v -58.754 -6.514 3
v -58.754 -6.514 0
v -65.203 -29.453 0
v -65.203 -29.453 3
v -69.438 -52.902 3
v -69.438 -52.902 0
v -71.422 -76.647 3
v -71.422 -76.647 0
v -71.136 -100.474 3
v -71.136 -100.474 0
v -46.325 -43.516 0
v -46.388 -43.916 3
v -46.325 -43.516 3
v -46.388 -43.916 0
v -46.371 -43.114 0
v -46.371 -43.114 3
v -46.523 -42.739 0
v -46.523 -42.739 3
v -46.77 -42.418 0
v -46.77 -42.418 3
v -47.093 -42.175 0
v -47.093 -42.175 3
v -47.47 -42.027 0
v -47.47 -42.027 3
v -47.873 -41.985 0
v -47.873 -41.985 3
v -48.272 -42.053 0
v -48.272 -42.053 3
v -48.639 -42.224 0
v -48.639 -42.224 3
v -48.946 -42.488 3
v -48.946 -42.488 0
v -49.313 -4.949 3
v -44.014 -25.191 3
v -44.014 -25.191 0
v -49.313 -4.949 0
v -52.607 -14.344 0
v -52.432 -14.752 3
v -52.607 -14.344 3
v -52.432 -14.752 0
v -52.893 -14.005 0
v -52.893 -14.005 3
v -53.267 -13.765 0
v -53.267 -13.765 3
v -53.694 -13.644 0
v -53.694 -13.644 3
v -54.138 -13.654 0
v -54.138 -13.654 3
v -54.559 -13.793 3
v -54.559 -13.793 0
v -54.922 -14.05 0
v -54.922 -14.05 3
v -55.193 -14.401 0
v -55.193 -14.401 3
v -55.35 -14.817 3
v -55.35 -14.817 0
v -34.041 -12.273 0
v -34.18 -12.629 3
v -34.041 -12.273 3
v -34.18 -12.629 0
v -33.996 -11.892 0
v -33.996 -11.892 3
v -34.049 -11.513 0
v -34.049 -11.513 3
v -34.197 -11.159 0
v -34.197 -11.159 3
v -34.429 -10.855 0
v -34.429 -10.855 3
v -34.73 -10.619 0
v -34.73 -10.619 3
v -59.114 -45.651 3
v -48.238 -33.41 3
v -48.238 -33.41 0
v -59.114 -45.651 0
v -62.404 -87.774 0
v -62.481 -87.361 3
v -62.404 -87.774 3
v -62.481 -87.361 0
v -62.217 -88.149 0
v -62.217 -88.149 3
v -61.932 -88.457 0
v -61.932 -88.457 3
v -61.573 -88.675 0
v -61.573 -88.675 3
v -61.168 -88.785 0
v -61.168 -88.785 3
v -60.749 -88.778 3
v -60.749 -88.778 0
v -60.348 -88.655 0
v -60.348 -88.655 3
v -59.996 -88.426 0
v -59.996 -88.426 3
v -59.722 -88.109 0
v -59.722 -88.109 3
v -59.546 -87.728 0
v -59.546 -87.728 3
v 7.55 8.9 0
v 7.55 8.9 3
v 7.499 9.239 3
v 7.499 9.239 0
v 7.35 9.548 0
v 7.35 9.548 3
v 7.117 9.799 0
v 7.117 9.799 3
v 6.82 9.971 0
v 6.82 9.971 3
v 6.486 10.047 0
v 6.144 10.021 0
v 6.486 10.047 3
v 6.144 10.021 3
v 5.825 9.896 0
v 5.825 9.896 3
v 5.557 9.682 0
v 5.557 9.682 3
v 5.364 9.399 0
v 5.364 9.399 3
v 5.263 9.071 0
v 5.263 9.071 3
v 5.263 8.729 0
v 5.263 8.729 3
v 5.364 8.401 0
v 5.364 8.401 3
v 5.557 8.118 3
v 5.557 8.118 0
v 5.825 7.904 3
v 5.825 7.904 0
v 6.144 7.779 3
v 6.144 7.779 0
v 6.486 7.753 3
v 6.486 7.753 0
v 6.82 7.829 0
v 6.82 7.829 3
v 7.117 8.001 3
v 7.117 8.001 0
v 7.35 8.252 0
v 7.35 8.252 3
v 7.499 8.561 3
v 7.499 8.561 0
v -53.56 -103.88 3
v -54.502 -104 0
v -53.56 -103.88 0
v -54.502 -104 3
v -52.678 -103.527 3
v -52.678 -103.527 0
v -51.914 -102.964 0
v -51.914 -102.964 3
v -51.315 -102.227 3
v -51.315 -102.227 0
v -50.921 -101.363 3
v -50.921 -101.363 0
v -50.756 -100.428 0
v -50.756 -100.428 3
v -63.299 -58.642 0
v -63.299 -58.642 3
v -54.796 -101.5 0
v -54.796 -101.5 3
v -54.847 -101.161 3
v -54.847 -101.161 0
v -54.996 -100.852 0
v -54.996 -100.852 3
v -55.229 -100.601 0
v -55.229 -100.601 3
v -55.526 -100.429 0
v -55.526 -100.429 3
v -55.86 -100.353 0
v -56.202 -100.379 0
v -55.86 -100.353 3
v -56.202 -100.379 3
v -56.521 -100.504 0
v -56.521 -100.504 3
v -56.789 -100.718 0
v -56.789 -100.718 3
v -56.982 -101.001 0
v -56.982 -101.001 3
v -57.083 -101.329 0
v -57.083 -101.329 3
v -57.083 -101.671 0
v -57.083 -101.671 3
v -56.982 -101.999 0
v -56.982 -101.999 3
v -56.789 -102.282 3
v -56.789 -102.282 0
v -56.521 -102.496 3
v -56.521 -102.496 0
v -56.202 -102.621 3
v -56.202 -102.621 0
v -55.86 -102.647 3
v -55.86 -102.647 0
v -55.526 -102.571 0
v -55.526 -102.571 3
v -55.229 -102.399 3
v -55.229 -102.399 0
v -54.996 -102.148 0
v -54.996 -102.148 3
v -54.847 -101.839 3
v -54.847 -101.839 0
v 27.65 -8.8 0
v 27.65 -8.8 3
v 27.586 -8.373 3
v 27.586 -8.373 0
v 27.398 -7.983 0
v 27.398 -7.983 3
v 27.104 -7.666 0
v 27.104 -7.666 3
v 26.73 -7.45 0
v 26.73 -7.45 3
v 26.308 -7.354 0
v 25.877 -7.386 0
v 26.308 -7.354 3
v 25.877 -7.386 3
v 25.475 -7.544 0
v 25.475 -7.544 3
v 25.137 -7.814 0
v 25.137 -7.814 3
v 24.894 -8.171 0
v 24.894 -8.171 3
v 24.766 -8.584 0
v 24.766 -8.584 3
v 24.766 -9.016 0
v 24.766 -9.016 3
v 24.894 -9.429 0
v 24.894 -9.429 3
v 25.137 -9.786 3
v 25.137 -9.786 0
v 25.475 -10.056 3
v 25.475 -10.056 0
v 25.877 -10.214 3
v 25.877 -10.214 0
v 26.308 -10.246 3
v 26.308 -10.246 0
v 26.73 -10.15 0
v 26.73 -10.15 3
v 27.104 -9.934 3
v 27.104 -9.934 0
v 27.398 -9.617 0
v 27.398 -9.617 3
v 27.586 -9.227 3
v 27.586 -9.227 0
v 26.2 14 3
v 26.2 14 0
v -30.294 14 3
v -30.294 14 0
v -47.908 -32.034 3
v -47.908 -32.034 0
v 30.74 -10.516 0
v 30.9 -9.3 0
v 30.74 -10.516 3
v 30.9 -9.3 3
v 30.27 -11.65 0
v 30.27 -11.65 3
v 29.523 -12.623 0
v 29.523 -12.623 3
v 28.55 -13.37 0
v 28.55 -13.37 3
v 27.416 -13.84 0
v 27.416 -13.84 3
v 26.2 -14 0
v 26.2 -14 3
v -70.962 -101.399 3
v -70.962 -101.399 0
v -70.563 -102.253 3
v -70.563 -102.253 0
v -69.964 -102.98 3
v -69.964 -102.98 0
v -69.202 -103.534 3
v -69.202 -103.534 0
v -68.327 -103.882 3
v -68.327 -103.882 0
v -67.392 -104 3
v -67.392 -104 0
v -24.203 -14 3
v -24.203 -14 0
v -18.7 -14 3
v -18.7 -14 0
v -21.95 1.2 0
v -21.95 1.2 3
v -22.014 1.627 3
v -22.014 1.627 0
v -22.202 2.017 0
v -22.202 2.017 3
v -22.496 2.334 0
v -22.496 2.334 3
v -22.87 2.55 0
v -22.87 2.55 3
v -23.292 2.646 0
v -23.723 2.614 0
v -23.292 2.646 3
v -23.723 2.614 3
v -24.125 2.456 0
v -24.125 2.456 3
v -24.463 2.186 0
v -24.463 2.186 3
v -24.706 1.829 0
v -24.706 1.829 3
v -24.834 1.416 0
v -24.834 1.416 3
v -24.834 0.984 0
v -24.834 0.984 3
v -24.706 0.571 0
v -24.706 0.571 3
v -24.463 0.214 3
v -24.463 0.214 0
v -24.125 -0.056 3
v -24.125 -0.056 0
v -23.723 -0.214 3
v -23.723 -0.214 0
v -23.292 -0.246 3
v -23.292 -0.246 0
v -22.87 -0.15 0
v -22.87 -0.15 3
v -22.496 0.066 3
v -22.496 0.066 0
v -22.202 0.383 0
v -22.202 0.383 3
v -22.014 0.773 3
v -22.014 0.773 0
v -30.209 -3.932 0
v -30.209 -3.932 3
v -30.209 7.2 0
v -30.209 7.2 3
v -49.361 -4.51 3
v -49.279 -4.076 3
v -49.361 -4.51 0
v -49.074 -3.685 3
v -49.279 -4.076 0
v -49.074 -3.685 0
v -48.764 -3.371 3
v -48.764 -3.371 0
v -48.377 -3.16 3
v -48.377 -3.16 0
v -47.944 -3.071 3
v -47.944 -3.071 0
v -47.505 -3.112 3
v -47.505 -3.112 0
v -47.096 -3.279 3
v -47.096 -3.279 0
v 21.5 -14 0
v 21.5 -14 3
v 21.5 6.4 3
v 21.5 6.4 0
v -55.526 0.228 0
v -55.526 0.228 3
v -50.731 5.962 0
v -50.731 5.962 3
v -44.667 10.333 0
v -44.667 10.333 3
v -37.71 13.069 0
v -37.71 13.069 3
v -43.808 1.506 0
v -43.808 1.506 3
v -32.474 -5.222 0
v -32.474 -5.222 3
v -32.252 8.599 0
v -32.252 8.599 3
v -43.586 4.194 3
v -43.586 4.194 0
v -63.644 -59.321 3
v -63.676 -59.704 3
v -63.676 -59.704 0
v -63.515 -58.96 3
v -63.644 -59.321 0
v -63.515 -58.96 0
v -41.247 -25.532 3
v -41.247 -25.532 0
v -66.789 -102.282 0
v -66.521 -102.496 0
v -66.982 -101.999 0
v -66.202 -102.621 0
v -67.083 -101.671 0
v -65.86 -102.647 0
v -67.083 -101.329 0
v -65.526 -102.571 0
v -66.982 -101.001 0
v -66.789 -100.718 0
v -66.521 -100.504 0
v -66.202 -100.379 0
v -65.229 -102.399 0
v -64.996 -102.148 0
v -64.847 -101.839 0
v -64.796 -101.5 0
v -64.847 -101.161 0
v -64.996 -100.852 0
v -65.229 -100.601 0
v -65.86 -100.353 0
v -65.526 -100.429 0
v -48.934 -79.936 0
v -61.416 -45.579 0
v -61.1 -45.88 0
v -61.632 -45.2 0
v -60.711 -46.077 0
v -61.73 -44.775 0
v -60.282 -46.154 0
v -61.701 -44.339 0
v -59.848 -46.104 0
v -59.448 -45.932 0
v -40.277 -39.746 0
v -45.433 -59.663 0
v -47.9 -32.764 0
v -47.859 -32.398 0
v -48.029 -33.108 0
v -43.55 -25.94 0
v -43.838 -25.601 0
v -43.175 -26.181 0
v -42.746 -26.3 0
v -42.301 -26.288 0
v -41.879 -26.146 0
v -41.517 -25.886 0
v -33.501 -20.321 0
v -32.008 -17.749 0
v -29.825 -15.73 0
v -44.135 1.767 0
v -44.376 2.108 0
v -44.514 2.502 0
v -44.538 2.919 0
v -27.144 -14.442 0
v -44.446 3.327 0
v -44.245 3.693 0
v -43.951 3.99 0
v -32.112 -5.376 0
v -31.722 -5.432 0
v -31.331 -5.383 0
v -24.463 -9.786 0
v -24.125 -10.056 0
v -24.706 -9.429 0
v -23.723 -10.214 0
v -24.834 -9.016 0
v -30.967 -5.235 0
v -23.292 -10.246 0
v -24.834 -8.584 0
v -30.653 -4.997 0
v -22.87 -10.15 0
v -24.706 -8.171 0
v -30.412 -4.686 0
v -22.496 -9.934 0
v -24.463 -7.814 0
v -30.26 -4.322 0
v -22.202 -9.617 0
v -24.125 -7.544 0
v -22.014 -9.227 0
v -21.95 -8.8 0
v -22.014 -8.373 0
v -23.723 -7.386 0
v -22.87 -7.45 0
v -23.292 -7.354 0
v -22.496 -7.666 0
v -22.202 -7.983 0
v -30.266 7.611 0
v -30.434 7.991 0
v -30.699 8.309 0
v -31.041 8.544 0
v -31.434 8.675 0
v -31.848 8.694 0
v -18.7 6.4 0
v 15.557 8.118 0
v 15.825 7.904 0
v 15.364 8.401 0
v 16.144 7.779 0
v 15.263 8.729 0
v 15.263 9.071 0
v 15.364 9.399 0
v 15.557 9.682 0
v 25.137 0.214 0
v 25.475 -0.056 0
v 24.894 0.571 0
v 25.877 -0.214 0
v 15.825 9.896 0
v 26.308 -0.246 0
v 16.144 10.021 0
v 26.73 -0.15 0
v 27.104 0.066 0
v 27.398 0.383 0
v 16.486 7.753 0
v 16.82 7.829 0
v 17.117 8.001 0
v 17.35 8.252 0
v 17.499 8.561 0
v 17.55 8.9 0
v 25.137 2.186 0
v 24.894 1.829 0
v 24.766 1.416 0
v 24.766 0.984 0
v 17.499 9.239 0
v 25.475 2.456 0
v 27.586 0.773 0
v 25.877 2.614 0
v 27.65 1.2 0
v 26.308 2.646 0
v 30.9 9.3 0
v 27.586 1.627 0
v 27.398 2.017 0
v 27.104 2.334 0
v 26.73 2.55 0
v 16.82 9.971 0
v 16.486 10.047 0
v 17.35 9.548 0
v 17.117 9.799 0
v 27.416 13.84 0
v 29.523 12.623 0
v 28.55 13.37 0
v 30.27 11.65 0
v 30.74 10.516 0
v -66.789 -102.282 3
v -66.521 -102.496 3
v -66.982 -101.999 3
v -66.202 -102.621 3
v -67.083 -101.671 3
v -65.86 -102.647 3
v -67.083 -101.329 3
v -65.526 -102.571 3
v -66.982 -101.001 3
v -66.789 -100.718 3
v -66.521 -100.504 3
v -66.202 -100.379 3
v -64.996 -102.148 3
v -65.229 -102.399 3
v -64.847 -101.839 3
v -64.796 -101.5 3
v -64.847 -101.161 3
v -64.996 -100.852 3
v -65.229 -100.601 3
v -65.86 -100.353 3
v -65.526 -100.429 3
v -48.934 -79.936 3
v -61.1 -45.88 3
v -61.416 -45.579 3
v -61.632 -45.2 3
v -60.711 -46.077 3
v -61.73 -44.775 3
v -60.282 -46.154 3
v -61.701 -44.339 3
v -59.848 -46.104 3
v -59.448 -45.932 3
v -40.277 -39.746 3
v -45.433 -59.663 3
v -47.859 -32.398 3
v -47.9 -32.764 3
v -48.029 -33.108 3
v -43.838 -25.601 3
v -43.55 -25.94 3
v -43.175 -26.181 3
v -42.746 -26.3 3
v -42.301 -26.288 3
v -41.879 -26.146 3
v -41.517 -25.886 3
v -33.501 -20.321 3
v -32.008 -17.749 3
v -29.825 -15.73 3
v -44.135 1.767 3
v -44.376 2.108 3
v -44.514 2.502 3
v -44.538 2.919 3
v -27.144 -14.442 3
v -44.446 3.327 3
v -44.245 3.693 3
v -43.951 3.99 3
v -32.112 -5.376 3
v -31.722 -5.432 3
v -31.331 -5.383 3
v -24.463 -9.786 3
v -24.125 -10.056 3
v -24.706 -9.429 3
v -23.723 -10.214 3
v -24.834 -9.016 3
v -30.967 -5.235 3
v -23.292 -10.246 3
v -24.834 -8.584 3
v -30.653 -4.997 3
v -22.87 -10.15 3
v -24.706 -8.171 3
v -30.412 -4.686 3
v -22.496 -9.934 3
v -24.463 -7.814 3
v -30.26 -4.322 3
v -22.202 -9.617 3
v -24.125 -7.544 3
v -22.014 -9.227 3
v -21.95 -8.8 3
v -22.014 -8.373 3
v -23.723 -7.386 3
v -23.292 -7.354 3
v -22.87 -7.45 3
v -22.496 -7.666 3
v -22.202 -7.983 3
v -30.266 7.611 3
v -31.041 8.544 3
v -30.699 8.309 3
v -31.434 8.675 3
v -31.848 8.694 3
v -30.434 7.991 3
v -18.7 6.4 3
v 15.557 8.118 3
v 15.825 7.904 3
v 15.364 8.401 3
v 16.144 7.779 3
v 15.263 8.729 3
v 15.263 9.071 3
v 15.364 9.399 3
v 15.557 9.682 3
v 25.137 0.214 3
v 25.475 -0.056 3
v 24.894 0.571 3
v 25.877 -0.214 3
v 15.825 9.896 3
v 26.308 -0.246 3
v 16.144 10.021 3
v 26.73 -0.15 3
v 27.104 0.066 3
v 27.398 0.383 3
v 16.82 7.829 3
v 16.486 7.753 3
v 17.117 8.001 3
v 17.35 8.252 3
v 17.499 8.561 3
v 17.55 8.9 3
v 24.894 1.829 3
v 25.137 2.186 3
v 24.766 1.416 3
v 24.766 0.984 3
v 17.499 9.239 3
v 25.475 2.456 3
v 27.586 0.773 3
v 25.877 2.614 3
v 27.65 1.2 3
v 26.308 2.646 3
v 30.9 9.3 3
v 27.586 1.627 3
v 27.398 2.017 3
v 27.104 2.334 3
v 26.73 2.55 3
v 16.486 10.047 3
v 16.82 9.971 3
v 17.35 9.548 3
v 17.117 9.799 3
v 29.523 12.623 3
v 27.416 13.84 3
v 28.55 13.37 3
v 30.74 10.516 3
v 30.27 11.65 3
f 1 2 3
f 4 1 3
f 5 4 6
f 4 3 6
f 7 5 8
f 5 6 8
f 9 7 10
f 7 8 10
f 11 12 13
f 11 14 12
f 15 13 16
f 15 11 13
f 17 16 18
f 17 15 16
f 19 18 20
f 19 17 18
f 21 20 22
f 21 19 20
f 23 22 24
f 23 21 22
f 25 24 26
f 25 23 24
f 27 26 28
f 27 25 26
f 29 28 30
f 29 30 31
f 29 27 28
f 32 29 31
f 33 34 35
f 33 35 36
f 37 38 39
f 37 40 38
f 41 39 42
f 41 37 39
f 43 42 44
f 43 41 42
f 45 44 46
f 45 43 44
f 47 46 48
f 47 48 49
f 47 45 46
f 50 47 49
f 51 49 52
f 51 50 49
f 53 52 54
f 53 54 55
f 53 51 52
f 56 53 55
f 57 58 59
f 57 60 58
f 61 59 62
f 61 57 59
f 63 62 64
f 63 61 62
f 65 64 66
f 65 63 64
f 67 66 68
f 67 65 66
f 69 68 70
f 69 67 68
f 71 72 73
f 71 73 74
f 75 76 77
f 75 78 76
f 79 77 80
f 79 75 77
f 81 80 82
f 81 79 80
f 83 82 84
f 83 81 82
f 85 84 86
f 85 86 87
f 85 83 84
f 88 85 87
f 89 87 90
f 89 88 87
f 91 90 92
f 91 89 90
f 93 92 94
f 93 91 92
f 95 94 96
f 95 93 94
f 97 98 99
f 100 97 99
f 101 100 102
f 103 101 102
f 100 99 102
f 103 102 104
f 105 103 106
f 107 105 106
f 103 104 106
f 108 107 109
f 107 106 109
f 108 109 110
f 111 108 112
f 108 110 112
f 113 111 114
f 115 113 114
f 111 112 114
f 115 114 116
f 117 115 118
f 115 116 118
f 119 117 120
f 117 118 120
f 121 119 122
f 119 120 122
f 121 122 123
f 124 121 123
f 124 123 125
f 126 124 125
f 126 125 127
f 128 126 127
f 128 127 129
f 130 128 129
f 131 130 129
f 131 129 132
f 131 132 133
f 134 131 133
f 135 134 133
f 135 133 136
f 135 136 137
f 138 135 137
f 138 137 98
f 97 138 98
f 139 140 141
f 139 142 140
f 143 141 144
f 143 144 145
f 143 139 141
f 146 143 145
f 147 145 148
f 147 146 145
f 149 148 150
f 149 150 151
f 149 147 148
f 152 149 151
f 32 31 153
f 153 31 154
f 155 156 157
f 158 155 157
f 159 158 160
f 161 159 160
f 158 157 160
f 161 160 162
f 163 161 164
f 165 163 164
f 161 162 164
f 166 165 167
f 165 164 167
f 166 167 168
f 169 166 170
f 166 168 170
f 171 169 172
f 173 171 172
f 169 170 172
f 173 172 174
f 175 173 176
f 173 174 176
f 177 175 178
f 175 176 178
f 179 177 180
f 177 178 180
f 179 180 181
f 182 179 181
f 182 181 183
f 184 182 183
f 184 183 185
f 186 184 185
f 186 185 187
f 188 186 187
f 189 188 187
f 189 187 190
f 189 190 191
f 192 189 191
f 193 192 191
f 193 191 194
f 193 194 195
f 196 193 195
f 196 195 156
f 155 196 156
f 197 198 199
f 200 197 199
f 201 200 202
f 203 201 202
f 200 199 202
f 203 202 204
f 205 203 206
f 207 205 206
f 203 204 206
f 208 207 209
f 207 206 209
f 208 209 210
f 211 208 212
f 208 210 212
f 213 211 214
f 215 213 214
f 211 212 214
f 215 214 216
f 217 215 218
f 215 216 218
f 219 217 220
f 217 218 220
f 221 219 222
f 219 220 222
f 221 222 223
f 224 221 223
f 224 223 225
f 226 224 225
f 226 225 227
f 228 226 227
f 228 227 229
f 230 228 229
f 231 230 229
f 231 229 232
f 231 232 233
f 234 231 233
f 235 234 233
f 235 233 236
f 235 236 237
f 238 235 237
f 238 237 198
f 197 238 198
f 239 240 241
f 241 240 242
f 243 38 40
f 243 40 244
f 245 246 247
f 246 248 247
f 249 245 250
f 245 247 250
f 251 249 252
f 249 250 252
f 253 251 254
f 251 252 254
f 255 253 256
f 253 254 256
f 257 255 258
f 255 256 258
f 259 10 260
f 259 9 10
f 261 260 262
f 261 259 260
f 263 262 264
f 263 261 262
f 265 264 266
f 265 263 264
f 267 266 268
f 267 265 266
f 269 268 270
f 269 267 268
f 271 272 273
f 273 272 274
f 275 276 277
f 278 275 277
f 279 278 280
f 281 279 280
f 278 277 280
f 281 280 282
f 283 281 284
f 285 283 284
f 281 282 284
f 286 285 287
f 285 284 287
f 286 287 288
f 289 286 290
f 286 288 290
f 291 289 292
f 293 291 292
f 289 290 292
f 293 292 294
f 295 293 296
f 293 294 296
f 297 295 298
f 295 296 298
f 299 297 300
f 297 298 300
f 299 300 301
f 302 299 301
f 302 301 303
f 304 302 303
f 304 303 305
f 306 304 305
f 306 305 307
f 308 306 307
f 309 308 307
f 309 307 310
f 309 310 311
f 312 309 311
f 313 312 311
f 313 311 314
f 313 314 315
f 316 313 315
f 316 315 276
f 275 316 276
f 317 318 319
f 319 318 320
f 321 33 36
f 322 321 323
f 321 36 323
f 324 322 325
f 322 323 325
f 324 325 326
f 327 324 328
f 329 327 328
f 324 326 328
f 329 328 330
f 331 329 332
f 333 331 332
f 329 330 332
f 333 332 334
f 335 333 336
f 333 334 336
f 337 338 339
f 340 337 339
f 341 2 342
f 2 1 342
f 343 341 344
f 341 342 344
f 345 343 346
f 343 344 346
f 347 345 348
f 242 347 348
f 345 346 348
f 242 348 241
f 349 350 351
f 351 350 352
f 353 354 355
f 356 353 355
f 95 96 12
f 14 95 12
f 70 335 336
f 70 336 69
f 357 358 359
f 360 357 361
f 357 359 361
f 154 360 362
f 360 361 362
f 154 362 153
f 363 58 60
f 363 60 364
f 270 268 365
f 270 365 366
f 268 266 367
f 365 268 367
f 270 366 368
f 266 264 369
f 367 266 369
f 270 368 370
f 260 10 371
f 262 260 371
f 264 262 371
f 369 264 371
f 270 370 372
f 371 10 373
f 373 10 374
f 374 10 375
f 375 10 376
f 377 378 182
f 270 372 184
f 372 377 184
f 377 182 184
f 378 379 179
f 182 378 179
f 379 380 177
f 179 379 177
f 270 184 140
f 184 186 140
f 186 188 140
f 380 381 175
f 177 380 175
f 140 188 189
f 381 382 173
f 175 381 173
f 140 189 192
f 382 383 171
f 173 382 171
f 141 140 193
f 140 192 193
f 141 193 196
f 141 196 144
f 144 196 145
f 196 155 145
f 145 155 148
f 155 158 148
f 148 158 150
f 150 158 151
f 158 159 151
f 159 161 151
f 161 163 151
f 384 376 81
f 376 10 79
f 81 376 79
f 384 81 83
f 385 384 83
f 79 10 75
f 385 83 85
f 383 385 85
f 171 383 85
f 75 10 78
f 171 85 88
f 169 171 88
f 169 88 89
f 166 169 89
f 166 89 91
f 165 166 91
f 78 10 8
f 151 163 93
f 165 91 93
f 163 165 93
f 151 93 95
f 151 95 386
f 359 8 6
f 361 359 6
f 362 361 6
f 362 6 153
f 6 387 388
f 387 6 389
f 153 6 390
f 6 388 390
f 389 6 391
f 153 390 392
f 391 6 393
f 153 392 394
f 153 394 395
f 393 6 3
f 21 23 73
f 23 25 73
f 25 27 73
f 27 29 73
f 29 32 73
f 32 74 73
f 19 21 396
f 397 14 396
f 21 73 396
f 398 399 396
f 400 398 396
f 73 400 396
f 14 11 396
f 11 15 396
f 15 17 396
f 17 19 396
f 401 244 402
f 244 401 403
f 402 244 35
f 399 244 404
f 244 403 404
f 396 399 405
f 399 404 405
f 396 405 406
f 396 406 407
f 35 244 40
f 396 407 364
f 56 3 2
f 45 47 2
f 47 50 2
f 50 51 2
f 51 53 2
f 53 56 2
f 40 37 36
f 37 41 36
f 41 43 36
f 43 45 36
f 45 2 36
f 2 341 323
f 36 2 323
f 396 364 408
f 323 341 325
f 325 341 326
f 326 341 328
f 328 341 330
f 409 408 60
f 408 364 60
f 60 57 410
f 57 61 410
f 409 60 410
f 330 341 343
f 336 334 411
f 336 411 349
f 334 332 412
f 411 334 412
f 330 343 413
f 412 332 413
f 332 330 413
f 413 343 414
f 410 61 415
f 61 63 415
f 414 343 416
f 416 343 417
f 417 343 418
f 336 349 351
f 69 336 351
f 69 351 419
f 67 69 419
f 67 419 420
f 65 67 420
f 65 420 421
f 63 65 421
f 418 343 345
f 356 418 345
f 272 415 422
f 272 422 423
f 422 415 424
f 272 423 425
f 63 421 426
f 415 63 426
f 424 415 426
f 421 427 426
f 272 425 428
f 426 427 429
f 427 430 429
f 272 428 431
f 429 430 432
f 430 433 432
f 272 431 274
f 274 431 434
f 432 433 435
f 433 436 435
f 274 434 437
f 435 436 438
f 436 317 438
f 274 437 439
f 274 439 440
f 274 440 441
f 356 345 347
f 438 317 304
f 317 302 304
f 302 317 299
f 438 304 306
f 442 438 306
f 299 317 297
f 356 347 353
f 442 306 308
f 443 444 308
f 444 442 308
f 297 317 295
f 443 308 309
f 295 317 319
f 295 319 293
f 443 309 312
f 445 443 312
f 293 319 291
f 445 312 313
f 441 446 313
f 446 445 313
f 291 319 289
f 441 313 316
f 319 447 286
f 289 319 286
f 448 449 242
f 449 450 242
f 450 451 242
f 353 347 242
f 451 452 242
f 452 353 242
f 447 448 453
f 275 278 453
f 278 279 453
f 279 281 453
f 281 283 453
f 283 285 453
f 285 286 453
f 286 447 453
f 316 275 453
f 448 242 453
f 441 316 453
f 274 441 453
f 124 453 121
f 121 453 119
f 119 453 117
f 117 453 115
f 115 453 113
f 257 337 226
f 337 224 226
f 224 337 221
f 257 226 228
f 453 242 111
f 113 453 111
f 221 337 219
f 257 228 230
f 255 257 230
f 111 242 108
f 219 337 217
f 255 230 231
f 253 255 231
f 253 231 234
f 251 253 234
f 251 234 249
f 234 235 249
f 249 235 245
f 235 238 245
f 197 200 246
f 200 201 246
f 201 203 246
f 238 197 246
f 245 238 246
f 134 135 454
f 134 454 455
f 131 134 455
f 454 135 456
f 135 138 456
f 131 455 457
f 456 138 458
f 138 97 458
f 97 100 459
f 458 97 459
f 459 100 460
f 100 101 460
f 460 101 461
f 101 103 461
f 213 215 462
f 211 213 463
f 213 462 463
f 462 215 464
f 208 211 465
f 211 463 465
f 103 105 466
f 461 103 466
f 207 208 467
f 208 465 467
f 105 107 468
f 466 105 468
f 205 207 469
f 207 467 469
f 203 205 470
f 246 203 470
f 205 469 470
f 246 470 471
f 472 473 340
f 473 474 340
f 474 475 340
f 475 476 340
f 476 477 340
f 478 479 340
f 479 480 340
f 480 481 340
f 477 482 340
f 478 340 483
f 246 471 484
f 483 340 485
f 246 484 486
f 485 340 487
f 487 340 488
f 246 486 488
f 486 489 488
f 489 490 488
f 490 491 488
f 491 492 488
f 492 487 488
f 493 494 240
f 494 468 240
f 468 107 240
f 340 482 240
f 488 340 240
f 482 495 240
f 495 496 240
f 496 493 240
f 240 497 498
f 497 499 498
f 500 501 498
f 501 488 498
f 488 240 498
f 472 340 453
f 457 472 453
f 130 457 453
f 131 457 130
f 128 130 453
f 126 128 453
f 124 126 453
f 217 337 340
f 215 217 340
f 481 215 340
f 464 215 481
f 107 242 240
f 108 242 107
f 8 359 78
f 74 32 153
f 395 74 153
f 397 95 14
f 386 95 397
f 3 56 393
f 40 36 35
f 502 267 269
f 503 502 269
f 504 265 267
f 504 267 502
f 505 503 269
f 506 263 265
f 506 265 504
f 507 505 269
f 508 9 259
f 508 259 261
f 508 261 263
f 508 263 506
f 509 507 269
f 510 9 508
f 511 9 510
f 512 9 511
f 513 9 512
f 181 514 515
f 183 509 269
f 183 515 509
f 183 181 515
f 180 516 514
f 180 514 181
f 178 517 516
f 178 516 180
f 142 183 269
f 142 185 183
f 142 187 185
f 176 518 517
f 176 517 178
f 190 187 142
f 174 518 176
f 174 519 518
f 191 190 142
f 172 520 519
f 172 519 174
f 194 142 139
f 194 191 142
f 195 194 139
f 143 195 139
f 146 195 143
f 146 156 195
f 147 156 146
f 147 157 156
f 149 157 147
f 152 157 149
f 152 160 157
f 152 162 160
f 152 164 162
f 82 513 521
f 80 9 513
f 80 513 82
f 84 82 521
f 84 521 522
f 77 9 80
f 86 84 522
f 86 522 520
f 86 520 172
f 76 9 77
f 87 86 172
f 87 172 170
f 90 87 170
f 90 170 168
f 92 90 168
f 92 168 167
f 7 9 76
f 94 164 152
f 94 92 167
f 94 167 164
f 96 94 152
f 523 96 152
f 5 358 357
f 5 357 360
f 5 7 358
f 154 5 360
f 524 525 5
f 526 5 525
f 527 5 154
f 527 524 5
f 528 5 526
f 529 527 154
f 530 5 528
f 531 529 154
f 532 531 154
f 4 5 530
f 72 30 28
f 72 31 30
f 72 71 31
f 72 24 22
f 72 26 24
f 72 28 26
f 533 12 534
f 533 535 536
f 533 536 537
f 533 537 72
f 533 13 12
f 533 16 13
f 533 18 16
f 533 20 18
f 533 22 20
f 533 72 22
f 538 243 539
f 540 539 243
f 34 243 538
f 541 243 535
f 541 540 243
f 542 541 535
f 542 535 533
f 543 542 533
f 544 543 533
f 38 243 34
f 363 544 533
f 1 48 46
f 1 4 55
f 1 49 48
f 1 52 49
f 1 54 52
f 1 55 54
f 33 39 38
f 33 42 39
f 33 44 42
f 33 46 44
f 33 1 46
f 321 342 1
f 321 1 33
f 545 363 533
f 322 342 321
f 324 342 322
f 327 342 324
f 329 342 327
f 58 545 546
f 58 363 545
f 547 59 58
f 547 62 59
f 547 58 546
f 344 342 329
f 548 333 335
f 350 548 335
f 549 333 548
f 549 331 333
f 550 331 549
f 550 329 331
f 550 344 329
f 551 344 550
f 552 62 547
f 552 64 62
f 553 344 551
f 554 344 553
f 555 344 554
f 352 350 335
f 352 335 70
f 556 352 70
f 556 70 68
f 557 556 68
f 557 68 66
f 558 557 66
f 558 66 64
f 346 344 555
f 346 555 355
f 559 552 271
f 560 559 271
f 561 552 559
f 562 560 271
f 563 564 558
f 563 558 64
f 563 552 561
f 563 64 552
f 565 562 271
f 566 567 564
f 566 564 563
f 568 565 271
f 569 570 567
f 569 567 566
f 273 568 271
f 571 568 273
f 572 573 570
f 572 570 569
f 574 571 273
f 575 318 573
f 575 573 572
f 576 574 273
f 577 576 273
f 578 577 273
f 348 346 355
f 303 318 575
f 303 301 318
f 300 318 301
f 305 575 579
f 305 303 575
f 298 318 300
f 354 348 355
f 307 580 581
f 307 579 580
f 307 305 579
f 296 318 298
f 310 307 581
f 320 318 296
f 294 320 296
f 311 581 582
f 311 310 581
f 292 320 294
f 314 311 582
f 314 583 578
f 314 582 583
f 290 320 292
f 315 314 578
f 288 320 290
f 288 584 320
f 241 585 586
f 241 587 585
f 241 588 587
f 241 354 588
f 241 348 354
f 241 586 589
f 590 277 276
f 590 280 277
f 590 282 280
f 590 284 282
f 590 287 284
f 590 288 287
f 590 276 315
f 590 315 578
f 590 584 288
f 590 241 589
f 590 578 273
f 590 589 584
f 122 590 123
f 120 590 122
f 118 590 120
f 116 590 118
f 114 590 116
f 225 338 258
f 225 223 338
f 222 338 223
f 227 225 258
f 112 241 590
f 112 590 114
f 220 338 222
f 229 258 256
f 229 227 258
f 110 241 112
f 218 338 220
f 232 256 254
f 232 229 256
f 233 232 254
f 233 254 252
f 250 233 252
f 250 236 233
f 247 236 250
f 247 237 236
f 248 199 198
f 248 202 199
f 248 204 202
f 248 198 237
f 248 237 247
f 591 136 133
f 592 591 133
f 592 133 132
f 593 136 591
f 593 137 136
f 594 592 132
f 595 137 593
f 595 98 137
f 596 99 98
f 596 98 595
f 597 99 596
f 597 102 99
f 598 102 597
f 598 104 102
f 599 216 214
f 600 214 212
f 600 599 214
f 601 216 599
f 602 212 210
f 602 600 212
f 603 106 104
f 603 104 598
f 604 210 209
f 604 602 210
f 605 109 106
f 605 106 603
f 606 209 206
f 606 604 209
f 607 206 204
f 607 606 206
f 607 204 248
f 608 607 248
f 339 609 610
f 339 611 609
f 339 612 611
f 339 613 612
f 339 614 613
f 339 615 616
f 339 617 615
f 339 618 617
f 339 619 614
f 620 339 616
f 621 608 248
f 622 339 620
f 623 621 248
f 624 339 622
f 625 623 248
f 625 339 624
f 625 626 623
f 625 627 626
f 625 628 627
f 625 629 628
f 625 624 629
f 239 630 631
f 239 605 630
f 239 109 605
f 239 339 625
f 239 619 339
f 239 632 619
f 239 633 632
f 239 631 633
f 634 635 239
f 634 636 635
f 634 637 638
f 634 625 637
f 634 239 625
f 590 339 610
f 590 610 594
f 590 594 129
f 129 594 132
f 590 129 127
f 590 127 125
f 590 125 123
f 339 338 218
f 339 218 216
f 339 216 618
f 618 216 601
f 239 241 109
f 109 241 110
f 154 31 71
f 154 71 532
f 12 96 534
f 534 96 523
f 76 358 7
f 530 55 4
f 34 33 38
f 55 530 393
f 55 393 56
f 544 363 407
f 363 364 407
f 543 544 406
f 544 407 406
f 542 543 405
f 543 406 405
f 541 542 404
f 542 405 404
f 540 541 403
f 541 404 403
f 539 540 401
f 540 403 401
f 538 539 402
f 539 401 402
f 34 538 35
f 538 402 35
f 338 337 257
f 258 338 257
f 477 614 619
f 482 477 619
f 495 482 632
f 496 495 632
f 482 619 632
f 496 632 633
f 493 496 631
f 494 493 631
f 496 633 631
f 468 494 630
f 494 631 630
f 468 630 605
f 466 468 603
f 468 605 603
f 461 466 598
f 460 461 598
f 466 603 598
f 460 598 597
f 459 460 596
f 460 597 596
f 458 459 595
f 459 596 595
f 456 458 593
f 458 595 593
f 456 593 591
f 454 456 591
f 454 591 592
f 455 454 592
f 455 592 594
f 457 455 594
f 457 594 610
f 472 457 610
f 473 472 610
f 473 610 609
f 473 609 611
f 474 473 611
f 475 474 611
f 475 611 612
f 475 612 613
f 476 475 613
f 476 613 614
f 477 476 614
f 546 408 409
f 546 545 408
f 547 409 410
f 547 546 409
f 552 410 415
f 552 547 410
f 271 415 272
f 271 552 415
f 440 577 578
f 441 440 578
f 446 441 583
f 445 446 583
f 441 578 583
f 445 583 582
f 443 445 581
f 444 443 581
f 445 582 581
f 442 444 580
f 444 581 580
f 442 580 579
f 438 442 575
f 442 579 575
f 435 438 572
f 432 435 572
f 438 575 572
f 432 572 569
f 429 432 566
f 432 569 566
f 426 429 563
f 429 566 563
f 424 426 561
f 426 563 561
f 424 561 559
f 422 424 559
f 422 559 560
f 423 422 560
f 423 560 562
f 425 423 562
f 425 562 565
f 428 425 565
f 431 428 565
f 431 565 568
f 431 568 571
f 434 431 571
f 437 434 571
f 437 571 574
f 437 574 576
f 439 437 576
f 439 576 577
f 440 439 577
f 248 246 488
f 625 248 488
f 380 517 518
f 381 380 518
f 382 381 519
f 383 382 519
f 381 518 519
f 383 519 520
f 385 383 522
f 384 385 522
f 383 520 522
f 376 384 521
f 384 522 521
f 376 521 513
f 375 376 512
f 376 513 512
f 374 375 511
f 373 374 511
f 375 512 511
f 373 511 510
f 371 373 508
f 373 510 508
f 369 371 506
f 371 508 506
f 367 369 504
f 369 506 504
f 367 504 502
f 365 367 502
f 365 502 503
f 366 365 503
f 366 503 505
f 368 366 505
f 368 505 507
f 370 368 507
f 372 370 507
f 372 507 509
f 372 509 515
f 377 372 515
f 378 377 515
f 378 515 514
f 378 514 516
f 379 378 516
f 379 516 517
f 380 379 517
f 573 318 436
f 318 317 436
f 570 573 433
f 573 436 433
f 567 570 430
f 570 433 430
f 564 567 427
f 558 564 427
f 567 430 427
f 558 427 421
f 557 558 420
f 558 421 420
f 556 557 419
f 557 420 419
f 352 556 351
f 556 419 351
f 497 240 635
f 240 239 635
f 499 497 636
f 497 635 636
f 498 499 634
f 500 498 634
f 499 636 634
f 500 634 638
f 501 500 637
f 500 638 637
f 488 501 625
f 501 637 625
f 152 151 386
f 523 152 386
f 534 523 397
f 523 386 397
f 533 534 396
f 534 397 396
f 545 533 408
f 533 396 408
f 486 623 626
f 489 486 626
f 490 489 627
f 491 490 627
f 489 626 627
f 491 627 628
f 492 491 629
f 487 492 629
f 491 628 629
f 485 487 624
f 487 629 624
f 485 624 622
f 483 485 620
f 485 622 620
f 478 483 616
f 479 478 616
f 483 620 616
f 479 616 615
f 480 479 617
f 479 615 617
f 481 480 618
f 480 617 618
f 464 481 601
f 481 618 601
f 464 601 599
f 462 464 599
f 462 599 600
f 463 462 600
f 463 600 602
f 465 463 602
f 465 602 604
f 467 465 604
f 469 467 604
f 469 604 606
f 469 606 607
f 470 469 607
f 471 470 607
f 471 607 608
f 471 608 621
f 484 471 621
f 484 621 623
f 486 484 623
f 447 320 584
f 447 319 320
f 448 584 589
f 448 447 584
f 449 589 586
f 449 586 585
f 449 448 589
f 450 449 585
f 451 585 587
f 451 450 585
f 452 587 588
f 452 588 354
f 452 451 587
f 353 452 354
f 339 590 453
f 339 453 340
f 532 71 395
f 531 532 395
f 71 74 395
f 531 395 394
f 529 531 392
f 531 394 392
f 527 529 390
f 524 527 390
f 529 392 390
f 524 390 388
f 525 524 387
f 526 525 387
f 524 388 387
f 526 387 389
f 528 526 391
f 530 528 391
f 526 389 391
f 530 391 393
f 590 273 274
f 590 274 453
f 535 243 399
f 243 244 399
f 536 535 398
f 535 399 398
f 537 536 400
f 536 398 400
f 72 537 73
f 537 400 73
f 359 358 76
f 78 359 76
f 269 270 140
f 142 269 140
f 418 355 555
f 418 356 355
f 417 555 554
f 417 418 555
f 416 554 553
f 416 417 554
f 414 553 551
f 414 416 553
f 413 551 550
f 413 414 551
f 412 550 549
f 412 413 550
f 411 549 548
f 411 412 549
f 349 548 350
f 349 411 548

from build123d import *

# Parameters (mm, degrees)
BOSS_EXTRU_1_DEPTH      = 3
ENL_V_MAT_EXTRU_1_REACH = 128.289
ESQUISSE2_W             = 40.2
ESQUISSE2_H             = 20.4
ENL_V_MAT_EXTRU_2_REACH = 128.289
ESQUISSE3_R             = 1.45
CONG_2_R                = 4.7
CONG_3_R                = 10
CONG_4_R                = 30
CONG_5_R                = 3.75
ENL_V_MAT_EXTRU_3_REACH = 128.289
CONG_6_R                = 1.5
ENL_V_MAT_EXTRU_4_REACH = 128.289
ESQUISSE5_R             = 1.15
ESQUISSE6_R             = 1.15
ENL_V_MAT_EXTRU_5_DEPTH = 10


with BuildPart() as part:
    # Esquisse1 → Boss.-Extru.1 (new body)
    with BuildSketch(Plane.XY):
        with BuildLine():
            Line((-30.9, 14), (-50.9, 14))
            ThreePointArc((-50.9, 14), (-68.065443638, -43.785518027), (-70.9, -104))
            Line((-70.9, -104), (-50.9, -104))
            ThreePointArc((-50.9, -104), (-45.084672315, -58.070072819), (-30.9, -14))
            Line((-30.9, -14), (30.9, -14))
            Line((30.9, -14), (30.9, 14))
            Line((30.9, 14), (-30.9, 14))
        make_face()
    extrude(amount=BOSS_EXTRU_1_DEPTH)

    # Esquisse2 → Enlèv. mat.-Extru.1 (cut, up to next)
    with BuildSketch(Plane.XY.offset(3), mode=Mode.PRIVATE) as enl_v_mat_extru_1_sk1:
        with Locations((1.4, -3.8)):
            Rectangle(ESQUISSE2_W, ESQUISSE2_H)
    enl_v_mat_extru_1_tool1 = extrude(enl_v_mat_extru_1_sk1.sketch, amount=-ENL_V_MAT_EXTRU_1_REACH, mode=Mode.PRIVATE) & part.part
    add(enl_v_mat_extru_1_tool1.solids().sort_by_distance((1.4, -3.8, 3))[0], mode=Mode.SUBTRACT)

    # Esquisse3 → Enlèv. mat.-Extru.2 (cut, up to next)
    with BuildSketch(Plane.XY.offset(3), mode=Mode.PRIVATE) as enl_v_mat_extru_2_sk1:
        with Locations((26.2, -8.8)):
            Circle(ESQUISSE3_R)
    enl_v_mat_extru_2_tool1 = extrude(enl_v_mat_extru_2_sk1.sketch, amount=-ENL_V_MAT_EXTRU_2_REACH, mode=Mode.PRIVATE) & part.part
    # Esquisse3 → Enlèv. mat.-Extru.2 (cut, up to next)
    with BuildSketch(Plane.XY.offset(3), mode=Mode.PRIVATE) as enl_v_mat_extru_2_sk2:
        with Locations((-23.4, -8.8)):
            Circle(ESQUISSE3_R)
    enl_v_mat_extru_2_tool2 = extrude(enl_v_mat_extru_2_sk2.sketch, amount=-ENL_V_MAT_EXTRU_2_REACH, mode=Mode.PRIVATE) & part.part
    # Esquisse3 → Enlèv. mat.-Extru.2 (cut, up to next)
    with BuildSketch(Plane.XY.offset(3), mode=Mode.PRIVATE) as enl_v_mat_extru_2_sk3:
        with Locations((-23.4, 1.2)):
            Circle(ESQUISSE3_R)
    enl_v_mat_extru_2_tool3 = extrude(enl_v_mat_extru_2_sk3.sketch, amount=-ENL_V_MAT_EXTRU_2_REACH, mode=Mode.PRIVATE) & part.part
    # Esquisse3 → Enlèv. mat.-Extru.2 (cut, up to next)
    with BuildSketch(Plane.XY.offset(3), mode=Mode.PRIVATE) as enl_v_mat_extru_2_sk4:
        with Locations((26.2, 1.2)):
            Circle(ESQUISSE3_R)
    enl_v_mat_extru_2_tool4 = extrude(enl_v_mat_extru_2_sk4.sketch, amount=-ENL_V_MAT_EXTRU_2_REACH, mode=Mode.PRIVATE) & part.part
    add(enl_v_mat_extru_2_tool1.solids().sort_by_distance((26.2, -8.8, 3))[0], mode=Mode.SUBTRACT)
    add(enl_v_mat_extru_2_tool2.solids().sort_by_distance((-23.4, -8.8, 3))[0], mode=Mode.SUBTRACT)
    add(enl_v_mat_extru_2_tool3.solids().sort_by_distance((-23.4, 1.2, 3))[0], mode=Mode.SUBTRACT)
    add(enl_v_mat_extru_2_tool4.solids().sort_by_distance((26.2, 1.2, 3))[0], mode=Mode.SUBTRACT)

    # Congé2
    cong_2_edges = [part.edges().sort_by_distance(p)[0] for p in [
        (30.9, -14, 1.5),
        (30.9, 14, 1.5),
    ]]
    fillet(cong_2_edges, radius=CONG_2_R)

    # Congé3
    cong_3_edges = [part.edges().sort_by_distance(p)[0] for p in [
        (-30.9, -14, 1.5),
    ]]
    fillet(cong_3_edges, radius=CONG_3_R)

    # Congé4
    cong_4_edges = [part.edges().sort_by_distance(p)[0] for p in [
        (-50.9, 14, 1.5),
    ]]
    fillet(cong_4_edges, radius=CONG_4_R)

    # Congé5
    cong_5_edges = [part.edges().sort_by_distance(p)[0] for p in [
        (-50.9, -104, 1.5),
        (-70.9, -104, 1.5),
    ]]
    fillet(cong_5_edges, radius=CONG_5_R)

    # Esquisse4 → Enlèv. mat.-Extru.3 (cut, up to next)
    with BuildSketch(Plane.XY.offset(3), mode=Mode.PRIVATE) as enl_v_mat_extru_3_sk1:
        Polygon((-33.484388558, -11.358463284), (-43.05887194, -28.83955138), (-50.238359759, -1.41390105), align=None)
    enl_v_mat_extru_3_tool1 = extrude(enl_v_mat_extru_3_sk1.sketch, amount=-ENL_V_MAT_EXTRU_3_REACH, mode=Mode.PRIVATE) & part.part
    # Esquisse4 → Enlèv. mat.-Extru.3 (cut, up to next)
    with BuildSketch(Plane.XY.offset(3), mode=Mode.PRIVATE) as enl_v_mat_extru_3_sk2:
        Polygon((-54.025759835, -8.664001443), (-47.704691317, -32.810489222), (-62.900626013, -49.913479621), align=None)
    enl_v_mat_extru_3_tool2 = extrude(enl_v_mat_extru_3_sk2.sketch, amount=-ENL_V_MAT_EXTRU_3_REACH, mode=Mode.PRIVATE) & part.part
    # Esquisse4 → Enlèv. mat.-Extru.3 (cut, up to next)
    with BuildSketch(Plane.XY.offset(3), mode=Mode.PRIVATE) as enl_v_mat_extru_3_sk3:
        Polygon((-44.434019708, -37.409998289), (-63.702500518, -59.0966302), (-62.097933842, -96.225533823), align=None)
    enl_v_mat_extru_3_tool3 = extrude(enl_v_mat_extru_3_sk3.sketch, amount=-ENL_V_MAT_EXTRU_3_REACH, mode=Mode.PRIVATE) & part.part
    # Esquisse4 → Enlèv. mat.-Extru.3 (cut, up to next)
    with BuildSketch(Plane.XY.offset(3), mode=Mode.PRIVATE) as enl_v_mat_extru_3_sk4:
        Polygon((-46.457316631, 3.078230456), (-30.208699652, -6.566371461), (-30.208699652, 9.392706582), align=None)
    enl_v_mat_extru_3_tool4 = extrude(enl_v_mat_extru_3_sk4.sketch, amount=-ENL_V_MAT_EXTRU_3_REACH, mode=Mode.PRIVATE) & part.part
    add(enl_v_mat_extru_3_tool1.solids().sort_by_distance((-42.26054, -13.870639, 3))[0], mode=Mode.SUBTRACT)
    add(enl_v_mat_extru_3_tool2.solids().sort_by_distance((-54.877026, -30.462657, 3))[0], mode=Mode.SUBTRACT)
    add(enl_v_mat_extru_3_tool3.solids().sort_by_distance((-56.744818, -64.244054, 3))[0], mode=Mode.SUBTRACT)
    add(enl_v_mat_extru_3_tool4.solids().sort_by_distance((-35.624905, 1.968189, 3))[0], mode=Mode.SUBTRACT)

    # Congé6
    cong_6_edges = [part.edges().sort_by_distance(p)[0] for p in [
        (-62.900626013, -49.913479621, 1.5),
        (-54.025759835, -8.664001443, 1.5),
        (-47.704691317, -32.810489222, 1.5),
        (-46.457316631, 3.078230456, 1.5),
        (-30.208699652, 9.392706582, 1.5),
        (-30.208699652, -6.566371461, 1.5),
        (-44.434019708, -37.409998289, 1.5),
        (-62.097933842, -96.225533823, 1.5),
        (-63.702500518, -59.0966302, 1.5),
        (-50.238359759, -1.41390105, 1.5),
        (-33.484388558, -11.358463284, 1.5),
        (-43.05887194, -28.83955138, 1.5),
    ]]
    fillet(cong_6_edges, radius=CONG_6_R)

    # Esquisse5 → Enlèv. mat.-Extru.4 (cut, up to next)
    with BuildSketch(Plane.XY.offset(3), mode=Mode.PRIVATE) as enl_v_mat_extru_4_sk1:
        with Locations((16.4, 8.9)):
            Circle(ESQUISSE5_R)
    enl_v_mat_extru_4_tool1 = extrude(enl_v_mat_extru_4_sk1.sketch, amount=-ENL_V_MAT_EXTRU_4_REACH, mode=Mode.PRIVATE) & part.part
    # Esquisse5 → Enlèv. mat.-Extru.4 (cut, up to next)
    with BuildSketch(Plane.XY.offset(3), mode=Mode.PRIVATE) as enl_v_mat_extru_4_sk2:
        with Locations((6.4, 8.9)):
            Circle(ESQUISSE5_R)
    enl_v_mat_extru_4_tool2 = extrude(enl_v_mat_extru_4_sk2.sketch, amount=-ENL_V_MAT_EXTRU_4_REACH, mode=Mode.PRIVATE) & part.part
    add(enl_v_mat_extru_4_tool1.solids().sort_by_distance((16.4, 8.9, 3))[0], mode=Mode.SUBTRACT)
    add(enl_v_mat_extru_4_tool2.solids().sort_by_distance((6.4, 8.9, 3))[0], mode=Mode.SUBTRACT)

    # Esquisse6 → Enlèv. mat.-Extru.5 (cut)
    with BuildSketch(Plane.XY.offset(3)):
        with Locations((-65.945726783, -101.5)):
            Circle(ESQUISSE6_R)
        with Locations((-55.945726783, -101.5)):
            Circle(ESQUISSE6_R)
    extrude(amount=-ENL_V_MAT_EXTRU_5_DEPTH, mode=Mode.SUBTRACT)


solid = part.part
